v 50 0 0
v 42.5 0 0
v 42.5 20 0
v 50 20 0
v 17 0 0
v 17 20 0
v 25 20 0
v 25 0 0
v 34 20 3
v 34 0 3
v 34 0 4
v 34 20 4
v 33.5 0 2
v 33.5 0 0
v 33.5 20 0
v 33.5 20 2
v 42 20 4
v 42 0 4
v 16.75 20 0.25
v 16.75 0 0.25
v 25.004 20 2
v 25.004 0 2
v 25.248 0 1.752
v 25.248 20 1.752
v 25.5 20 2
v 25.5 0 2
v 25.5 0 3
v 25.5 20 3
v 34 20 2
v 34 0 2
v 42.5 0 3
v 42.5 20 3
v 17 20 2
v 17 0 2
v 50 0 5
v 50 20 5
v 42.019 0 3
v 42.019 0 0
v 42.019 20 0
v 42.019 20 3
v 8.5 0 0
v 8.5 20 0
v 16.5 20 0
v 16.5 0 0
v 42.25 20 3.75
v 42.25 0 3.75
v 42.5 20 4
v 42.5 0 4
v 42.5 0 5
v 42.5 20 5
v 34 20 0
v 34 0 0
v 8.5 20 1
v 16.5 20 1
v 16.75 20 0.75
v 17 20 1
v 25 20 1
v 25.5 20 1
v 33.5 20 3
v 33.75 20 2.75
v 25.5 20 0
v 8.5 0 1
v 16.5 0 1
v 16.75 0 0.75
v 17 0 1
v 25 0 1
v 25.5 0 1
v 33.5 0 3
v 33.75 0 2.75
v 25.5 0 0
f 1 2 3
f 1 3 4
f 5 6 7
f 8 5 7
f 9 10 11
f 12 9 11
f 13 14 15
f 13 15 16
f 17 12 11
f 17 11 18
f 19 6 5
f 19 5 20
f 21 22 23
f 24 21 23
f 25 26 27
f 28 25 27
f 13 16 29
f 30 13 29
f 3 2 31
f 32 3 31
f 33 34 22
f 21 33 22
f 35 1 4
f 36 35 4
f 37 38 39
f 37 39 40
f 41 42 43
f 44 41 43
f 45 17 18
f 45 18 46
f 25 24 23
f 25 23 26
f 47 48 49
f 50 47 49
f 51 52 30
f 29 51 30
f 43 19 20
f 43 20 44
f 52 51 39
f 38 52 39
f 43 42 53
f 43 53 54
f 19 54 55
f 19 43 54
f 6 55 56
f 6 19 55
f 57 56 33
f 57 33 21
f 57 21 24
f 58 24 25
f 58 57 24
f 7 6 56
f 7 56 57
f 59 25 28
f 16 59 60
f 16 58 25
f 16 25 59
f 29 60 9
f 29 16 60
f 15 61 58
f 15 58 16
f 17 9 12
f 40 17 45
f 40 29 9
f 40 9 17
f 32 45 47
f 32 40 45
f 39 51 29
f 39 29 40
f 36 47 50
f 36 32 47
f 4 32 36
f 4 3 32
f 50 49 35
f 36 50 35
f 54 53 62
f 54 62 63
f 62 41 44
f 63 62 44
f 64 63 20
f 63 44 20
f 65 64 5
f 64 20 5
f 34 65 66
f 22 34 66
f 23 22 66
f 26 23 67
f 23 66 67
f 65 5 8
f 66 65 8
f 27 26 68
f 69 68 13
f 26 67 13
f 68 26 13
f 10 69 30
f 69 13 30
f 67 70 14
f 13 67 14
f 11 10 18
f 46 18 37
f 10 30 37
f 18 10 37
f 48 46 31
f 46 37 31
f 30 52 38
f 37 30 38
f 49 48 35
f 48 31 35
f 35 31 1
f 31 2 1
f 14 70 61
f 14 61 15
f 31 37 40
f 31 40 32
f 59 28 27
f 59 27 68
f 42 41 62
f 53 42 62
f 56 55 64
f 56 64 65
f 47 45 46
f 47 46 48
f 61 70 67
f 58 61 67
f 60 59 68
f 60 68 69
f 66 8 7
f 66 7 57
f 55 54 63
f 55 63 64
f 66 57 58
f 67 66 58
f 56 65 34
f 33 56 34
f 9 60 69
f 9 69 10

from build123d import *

# Parameters (mm, degrees)
F0_W     = 50
F0_H     = 20
F1_DEPTH = 5
F3_DEPTH = 25
F4_W     = 0.4809010029
F4_H     = 3
F4_W_2   = 0.5
F4_H_2   = 2
F4_H_3   = 1
F5_DEPTH = 25
F7_DEPTH = 25


with BuildPart() as f1:
    # F0 (on Top) → F1 (new body)
    with BuildSketch(Plane.XY):
        with Locations((25, 10)):
            Rectangle(F0_W, F0_H)
    extrude(amount=F1_DEPTH)

    # F2 (on face) → F3 (cut)
    with BuildSketch(Plane.XZ):
        Polygon((0, 5), (0, 0), (42.5, 5), align=None)
    extrude(amount=-F3_DEPTH, mode=Mode.SUBTRACT)

    # F4 (on face) → F5 (cut)
    with BuildSketch(Plane.XZ):
        Polygon((42.5, 5), (34, 4), (42, 4), (42.5, 4), align=None)
        Polygon((34, 4), (25.5, 3), (33.5, 3), (34, 3), align=None)
        Polygon((25.5, 3), (17, 2), (25.0037251041, 2), (25, 2.0037817754), (25.5, 2), align=None)
        Polygon((17, 2), (8.5, 1), (16.5, 1), (17, 1), align=None)
        Polygon((17, 1), (16.5, 1), (16.75, 0.75), align=None)
        Polygon((25, 2.0037817754), (25.0037251041, 2), (25.5, 2), align=None)
        Polygon((25.5, 2), (25.0037251041, 2), (25.2481091664, 1.7518980383), align=None)
        Polygon((34, 3), (33.5, 3), (33.75, 2.75), align=None)
        Polygon((42.5, 4), (42, 4), (42.25, 3.75), align=None)
        Polygon((17, 0), (16.75, 0.25), (16.5, 0), align=None)
        with Locations((42.2595494986, 1.5)):
            Rectangle(F4_W, F4_H)
        with Locations((33.75, 1)):
            Rectangle(F4_W_2, F4_H_2)
        with Locations((25.25, 0.5)):
            Rectangle(F4_W_2, F4_H_3)
    extrude(amount=-F5_DEPTH, mode=Mode.SUBTRACT)

    # F6 (on face) → F7 (cut)
    with BuildSketch(Plane.XZ):
        Polygon((8.5, 0), (8.5, 1), (0, 0), align=None)
    extrude(amount=-F7_DEPTH, mode=Mode.SUBTRACT)


solid = f1.part
